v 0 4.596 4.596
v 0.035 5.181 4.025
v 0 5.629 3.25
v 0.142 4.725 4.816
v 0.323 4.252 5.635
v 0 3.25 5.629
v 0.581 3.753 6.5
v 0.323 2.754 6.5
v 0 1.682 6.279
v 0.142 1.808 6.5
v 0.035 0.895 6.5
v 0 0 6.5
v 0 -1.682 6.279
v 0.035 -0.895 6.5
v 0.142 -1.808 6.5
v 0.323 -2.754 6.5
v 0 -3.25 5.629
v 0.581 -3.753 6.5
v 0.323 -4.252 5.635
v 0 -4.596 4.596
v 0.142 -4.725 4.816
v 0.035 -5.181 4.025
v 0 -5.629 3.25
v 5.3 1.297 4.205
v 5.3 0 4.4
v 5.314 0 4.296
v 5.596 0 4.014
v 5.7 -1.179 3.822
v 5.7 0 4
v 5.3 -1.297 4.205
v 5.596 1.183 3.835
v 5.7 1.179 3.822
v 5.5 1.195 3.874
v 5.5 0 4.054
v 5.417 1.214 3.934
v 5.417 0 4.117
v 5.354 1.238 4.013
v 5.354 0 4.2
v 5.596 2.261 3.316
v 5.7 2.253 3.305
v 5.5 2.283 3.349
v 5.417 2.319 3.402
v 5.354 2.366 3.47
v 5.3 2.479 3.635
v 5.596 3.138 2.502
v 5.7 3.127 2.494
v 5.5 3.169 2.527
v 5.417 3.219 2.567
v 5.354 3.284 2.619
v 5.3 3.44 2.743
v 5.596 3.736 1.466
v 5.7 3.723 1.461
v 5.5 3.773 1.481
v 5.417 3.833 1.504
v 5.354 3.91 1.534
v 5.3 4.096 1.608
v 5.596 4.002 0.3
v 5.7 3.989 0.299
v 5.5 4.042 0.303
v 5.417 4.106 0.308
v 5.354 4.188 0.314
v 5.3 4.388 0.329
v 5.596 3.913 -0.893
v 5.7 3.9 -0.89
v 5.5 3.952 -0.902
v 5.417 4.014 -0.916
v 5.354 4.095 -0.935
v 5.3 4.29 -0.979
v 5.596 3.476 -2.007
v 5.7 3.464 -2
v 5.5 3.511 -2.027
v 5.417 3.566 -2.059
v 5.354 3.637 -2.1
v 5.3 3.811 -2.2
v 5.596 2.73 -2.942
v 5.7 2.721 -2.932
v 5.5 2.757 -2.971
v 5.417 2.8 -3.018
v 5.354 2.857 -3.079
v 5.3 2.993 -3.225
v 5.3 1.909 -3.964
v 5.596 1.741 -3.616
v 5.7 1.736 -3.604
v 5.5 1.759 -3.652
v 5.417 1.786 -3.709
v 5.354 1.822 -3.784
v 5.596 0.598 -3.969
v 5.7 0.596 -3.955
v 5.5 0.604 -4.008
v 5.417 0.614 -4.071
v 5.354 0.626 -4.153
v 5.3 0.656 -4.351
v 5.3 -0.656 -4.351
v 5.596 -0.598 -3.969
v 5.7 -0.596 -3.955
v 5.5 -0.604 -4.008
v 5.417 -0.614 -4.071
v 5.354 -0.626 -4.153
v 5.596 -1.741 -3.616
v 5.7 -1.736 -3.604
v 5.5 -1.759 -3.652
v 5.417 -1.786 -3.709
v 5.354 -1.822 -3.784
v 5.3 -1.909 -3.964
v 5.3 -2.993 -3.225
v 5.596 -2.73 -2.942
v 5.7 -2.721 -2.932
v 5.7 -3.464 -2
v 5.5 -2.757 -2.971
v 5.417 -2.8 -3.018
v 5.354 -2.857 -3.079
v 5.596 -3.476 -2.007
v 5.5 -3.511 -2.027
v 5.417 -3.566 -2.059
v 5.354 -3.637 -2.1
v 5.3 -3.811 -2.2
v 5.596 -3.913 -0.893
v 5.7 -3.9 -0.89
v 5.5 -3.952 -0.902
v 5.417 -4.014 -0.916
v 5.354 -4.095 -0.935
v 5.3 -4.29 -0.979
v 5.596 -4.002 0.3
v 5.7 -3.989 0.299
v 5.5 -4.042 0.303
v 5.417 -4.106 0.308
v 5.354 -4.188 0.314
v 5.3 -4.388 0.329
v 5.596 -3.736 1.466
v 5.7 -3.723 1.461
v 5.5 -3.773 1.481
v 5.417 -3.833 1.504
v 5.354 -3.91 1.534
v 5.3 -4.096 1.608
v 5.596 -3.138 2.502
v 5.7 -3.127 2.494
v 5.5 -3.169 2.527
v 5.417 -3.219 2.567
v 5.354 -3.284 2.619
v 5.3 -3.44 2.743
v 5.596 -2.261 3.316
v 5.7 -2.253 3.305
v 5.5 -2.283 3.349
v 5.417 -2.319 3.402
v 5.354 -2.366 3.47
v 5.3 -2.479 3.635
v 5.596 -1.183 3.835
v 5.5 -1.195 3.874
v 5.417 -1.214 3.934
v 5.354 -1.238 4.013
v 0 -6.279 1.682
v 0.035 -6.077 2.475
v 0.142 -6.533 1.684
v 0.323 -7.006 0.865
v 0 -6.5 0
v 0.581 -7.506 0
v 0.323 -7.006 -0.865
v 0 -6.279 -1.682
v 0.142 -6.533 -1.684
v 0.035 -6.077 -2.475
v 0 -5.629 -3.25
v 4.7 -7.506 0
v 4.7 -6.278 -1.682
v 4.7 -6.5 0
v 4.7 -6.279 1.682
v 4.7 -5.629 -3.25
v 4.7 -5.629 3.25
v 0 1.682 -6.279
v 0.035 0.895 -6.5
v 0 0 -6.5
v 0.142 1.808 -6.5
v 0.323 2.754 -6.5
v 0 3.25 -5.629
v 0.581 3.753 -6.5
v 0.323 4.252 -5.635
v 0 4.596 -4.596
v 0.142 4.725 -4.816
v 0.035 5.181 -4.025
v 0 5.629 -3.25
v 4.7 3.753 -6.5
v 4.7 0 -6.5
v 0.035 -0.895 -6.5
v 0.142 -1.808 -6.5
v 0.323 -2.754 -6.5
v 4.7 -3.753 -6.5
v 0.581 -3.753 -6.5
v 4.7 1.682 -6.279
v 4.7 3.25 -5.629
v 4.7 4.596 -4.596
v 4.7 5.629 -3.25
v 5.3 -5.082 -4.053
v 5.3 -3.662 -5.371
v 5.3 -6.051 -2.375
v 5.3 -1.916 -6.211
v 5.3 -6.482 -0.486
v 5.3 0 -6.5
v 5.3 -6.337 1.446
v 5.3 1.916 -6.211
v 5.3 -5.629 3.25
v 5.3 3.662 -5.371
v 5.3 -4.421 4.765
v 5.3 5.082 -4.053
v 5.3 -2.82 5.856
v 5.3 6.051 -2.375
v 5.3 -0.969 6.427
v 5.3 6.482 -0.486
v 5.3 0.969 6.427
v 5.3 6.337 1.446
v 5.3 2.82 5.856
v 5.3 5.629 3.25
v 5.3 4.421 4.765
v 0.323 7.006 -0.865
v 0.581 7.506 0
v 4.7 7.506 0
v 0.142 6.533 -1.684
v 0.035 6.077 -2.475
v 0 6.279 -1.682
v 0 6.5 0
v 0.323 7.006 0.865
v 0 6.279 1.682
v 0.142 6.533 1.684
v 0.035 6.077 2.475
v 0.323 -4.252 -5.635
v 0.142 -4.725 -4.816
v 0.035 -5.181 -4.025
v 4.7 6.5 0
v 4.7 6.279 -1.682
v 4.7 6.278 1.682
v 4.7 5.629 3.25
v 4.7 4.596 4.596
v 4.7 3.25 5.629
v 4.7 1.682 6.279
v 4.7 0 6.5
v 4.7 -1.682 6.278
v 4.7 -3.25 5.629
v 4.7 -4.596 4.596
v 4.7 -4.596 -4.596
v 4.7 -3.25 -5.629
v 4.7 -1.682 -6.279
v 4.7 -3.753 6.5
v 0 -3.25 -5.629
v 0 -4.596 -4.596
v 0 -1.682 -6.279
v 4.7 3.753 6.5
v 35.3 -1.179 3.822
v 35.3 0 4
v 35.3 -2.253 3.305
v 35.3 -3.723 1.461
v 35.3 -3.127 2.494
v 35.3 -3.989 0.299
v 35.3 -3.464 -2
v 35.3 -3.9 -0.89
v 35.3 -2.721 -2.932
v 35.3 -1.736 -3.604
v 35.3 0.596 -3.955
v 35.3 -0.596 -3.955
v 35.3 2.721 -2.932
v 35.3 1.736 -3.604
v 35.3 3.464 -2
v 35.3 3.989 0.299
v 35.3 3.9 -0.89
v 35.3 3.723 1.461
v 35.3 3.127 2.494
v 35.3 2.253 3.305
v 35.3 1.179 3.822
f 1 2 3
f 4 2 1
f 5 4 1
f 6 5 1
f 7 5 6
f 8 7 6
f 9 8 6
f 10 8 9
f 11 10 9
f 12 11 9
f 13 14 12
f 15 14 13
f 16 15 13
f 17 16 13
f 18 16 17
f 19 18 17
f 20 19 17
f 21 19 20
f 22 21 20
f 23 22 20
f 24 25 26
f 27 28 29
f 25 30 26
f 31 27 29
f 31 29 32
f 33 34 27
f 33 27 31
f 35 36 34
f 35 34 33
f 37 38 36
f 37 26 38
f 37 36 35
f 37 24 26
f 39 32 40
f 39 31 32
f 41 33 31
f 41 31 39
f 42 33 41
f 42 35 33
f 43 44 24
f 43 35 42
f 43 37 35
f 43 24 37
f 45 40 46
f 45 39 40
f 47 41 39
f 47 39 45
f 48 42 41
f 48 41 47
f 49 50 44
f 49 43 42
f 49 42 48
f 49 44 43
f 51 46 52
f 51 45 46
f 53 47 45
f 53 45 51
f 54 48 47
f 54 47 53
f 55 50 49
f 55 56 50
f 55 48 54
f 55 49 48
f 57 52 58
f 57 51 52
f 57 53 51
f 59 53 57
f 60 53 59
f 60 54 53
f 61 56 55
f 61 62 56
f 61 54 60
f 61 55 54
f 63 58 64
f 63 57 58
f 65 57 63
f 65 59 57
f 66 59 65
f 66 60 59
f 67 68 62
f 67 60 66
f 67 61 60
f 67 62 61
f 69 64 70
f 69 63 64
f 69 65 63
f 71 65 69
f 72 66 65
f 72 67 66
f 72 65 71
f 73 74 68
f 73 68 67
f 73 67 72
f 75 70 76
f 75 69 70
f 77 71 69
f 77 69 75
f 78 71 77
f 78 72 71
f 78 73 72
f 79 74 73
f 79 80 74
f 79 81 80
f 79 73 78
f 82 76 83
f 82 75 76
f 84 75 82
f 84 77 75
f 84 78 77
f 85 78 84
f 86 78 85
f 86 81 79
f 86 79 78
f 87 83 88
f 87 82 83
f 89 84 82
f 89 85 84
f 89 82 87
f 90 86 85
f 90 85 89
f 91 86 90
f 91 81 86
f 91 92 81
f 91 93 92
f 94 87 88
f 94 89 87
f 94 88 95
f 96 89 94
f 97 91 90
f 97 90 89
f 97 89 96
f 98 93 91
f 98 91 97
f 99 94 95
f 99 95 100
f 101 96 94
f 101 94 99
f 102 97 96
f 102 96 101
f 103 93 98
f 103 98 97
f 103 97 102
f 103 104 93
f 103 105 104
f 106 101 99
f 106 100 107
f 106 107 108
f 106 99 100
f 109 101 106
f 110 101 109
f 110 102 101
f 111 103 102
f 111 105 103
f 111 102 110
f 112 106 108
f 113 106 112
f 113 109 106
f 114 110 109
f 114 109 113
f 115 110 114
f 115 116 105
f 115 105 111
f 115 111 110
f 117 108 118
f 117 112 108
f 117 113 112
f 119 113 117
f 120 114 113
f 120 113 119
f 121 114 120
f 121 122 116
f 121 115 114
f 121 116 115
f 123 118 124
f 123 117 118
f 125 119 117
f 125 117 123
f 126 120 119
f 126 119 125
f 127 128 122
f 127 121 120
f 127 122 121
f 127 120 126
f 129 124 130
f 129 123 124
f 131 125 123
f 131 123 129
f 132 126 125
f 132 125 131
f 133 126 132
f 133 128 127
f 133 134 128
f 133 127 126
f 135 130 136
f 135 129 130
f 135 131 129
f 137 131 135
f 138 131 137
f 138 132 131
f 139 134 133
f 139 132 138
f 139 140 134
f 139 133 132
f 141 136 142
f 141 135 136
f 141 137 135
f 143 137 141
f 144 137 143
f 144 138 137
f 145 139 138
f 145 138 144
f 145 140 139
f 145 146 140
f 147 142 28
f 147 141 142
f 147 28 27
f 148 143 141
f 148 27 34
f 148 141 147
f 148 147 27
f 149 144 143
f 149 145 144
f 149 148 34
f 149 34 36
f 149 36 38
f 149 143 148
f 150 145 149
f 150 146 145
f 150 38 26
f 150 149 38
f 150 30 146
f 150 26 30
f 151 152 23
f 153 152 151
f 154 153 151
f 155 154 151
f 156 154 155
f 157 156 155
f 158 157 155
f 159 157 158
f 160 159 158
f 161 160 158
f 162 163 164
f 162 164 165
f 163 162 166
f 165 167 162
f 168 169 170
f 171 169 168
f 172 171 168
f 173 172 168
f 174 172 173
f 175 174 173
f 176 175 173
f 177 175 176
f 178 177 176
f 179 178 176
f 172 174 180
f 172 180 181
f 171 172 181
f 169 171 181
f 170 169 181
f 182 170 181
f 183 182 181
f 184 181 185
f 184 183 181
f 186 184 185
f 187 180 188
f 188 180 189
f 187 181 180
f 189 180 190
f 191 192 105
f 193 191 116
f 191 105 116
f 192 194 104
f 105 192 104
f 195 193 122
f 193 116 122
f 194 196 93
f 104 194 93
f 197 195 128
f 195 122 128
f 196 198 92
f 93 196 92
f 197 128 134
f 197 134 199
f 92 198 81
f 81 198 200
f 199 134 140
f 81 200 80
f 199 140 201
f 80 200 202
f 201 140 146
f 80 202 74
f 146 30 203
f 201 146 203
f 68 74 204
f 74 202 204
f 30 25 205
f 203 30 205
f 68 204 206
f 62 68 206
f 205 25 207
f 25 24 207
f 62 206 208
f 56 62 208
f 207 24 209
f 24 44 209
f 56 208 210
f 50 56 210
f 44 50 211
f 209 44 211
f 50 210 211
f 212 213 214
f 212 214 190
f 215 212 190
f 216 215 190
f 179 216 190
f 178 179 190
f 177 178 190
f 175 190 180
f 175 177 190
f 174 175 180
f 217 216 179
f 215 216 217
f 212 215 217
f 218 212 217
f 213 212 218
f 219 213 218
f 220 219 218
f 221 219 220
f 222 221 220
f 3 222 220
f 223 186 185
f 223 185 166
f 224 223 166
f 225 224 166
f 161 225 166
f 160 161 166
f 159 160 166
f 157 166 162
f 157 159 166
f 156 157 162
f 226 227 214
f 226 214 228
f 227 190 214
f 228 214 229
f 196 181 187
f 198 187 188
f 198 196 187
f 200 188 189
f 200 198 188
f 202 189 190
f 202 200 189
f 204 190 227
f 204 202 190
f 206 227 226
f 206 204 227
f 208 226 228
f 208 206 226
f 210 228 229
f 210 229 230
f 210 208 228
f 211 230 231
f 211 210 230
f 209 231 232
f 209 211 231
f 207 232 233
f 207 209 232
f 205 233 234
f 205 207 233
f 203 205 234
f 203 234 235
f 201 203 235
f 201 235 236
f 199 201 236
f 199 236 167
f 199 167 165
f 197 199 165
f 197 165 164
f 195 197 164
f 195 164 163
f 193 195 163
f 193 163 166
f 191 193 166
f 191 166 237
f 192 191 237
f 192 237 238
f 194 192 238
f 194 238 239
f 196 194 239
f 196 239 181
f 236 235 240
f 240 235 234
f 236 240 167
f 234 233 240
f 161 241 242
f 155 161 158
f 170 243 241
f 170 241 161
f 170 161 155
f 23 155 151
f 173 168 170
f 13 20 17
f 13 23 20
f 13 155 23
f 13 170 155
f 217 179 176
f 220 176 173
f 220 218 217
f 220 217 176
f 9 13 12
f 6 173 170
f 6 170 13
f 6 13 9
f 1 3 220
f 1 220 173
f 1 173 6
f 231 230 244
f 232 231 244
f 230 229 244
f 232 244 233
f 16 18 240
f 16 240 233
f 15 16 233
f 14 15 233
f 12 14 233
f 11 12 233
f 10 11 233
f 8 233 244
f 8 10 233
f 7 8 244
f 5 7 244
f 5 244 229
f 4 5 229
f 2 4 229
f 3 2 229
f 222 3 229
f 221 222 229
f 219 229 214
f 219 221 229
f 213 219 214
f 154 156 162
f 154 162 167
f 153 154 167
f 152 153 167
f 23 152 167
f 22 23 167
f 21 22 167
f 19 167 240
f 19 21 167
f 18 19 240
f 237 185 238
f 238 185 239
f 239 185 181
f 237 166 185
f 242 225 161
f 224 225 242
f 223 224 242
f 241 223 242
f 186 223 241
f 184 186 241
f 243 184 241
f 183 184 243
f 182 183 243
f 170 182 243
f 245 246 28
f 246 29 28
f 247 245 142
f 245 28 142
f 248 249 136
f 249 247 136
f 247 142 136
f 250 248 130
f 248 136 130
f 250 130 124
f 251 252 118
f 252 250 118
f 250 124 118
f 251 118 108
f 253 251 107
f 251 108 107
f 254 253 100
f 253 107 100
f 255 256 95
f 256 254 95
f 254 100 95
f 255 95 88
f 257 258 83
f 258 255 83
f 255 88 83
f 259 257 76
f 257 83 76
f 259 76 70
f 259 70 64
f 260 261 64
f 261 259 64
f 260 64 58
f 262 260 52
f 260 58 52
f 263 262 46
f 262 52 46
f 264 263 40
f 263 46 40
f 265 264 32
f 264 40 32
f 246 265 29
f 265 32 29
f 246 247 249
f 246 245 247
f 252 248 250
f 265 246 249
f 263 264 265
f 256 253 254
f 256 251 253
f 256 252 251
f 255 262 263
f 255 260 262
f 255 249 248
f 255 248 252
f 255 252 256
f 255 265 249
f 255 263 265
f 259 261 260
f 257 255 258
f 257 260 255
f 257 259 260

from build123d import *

# Parameters (mm, degrees)
EXTRUDE_359_DEPTH   = 5.3
SKETCH_4_W          = 0.6
SKETCH_4_H          = 11.005553499
CHAMFER_1890_SIZE   = 1
FILLET_1935_R       = 0.4
SKETCH_7_R          = 6.006178493
CUT_EXTRUDE_1_DEPTH = 10


with BuildPart() as part:
    # 草图1 → Extrude 359 (new body)
    with BuildSketch(Plane(origin=(0, 0, 0), x_dir=(0, 0, -1), z_dir=(1, 0, 0))):
        Polygon((6.5, 3.75277675), (6.5, -3.75277675), (0, -7.505553499), (-6.5, -3.75277675), (-6.5, 3.75277675), (0, 7.505553499), align=None)
    extrude(amount=EXTRUDE_359_DEPTH)

    # 草图2 → 凸台-旋转1 (revolve)
    with BuildSketch(Plane.XY, mode=Mode.PRIVATE) as revolve_1_sk:
        Polygon((0, 0), (45.3, 0), (45.3, 2.9175), (45.3, 4), (0, 4), align=None)
    revolve(revolve_1_sk.sketch.rotate(Axis((0, 0, 0), (1, 0, 0)), 90), axis=Axis((0, 0, 0), (1, 0, 0)))

    # 草图3 → 切除-旋转1 (revolve, cut)
    with BuildSketch(Plane.XY):
        Polygon((0, 6.5), (3.46730793, 12.505553499), (3.46730793, 17.505553499), (-10, 17.505553499), (-10, 6.5), align=None)
    revolve(axis=Axis((0, 0, 0), (1, 0, 0)), mode=Mode.SUBTRACT)

    # 草图5 → 切除-旋转2 (revolve, cut)
    with BuildSketch(Plane.XY):
        Polygon((5.3, 6.5), (1.83269207, 12.505553499), (1.83269207, 17.505553499), (11.83269207, 17.505553499), (11.83269207, 6.5), align=None)
    revolve(axis=Axis((0, 0, 0), (1, 0, 0)), mode=Mode.SUBTRACT)

    # 草图4 → 切除-旋转3 (revolve, cut)
    with BuildSketch(Plane.XY, mode=Mode.PRIVATE) as cut_revolve_3_sk:
        with Locations((5, 12.00277675)):
            Rectangle(SKETCH_4_W, SKETCH_4_H)
    revolve(cut_revolve_3_sk.sketch.rotate(Axis((0, 0, 0), (1, 0, 0)), 270), axis=Axis((0, 0, 0), (1, 0, 0)), mode=Mode.SUBTRACT)

    # Chamfer 1890
    chamfer_1890_edges = [part.edges().sort_by_distance(p)[0] for p in [
        (45.3, 0, -4),
    ]]
    chamfer(chamfer_1890_edges, length=CHAMFER_1890_SIZE)

    # Fillet 1935
    fillet_1935_edges = [part.edges().sort_by_distance(p)[0] for p in [
        (5.3, 0, -4),
    ]]
    fillet(fillet_1935_edges, radius=FILLET_1935_R)

    # 草图7 → 切除-拉伸1 (cut)
    with BuildSketch(Plane(origin=(45.3, 0, 0), x_dir=(0, 0, -1), z_dir=(1, 0, 0))):
        Circle(SKETCH_7_R)
    extrude(amount=-CUT_EXTRUDE_1_DEPTH, mode=Mode.SUBTRACT)


solid = part.part
